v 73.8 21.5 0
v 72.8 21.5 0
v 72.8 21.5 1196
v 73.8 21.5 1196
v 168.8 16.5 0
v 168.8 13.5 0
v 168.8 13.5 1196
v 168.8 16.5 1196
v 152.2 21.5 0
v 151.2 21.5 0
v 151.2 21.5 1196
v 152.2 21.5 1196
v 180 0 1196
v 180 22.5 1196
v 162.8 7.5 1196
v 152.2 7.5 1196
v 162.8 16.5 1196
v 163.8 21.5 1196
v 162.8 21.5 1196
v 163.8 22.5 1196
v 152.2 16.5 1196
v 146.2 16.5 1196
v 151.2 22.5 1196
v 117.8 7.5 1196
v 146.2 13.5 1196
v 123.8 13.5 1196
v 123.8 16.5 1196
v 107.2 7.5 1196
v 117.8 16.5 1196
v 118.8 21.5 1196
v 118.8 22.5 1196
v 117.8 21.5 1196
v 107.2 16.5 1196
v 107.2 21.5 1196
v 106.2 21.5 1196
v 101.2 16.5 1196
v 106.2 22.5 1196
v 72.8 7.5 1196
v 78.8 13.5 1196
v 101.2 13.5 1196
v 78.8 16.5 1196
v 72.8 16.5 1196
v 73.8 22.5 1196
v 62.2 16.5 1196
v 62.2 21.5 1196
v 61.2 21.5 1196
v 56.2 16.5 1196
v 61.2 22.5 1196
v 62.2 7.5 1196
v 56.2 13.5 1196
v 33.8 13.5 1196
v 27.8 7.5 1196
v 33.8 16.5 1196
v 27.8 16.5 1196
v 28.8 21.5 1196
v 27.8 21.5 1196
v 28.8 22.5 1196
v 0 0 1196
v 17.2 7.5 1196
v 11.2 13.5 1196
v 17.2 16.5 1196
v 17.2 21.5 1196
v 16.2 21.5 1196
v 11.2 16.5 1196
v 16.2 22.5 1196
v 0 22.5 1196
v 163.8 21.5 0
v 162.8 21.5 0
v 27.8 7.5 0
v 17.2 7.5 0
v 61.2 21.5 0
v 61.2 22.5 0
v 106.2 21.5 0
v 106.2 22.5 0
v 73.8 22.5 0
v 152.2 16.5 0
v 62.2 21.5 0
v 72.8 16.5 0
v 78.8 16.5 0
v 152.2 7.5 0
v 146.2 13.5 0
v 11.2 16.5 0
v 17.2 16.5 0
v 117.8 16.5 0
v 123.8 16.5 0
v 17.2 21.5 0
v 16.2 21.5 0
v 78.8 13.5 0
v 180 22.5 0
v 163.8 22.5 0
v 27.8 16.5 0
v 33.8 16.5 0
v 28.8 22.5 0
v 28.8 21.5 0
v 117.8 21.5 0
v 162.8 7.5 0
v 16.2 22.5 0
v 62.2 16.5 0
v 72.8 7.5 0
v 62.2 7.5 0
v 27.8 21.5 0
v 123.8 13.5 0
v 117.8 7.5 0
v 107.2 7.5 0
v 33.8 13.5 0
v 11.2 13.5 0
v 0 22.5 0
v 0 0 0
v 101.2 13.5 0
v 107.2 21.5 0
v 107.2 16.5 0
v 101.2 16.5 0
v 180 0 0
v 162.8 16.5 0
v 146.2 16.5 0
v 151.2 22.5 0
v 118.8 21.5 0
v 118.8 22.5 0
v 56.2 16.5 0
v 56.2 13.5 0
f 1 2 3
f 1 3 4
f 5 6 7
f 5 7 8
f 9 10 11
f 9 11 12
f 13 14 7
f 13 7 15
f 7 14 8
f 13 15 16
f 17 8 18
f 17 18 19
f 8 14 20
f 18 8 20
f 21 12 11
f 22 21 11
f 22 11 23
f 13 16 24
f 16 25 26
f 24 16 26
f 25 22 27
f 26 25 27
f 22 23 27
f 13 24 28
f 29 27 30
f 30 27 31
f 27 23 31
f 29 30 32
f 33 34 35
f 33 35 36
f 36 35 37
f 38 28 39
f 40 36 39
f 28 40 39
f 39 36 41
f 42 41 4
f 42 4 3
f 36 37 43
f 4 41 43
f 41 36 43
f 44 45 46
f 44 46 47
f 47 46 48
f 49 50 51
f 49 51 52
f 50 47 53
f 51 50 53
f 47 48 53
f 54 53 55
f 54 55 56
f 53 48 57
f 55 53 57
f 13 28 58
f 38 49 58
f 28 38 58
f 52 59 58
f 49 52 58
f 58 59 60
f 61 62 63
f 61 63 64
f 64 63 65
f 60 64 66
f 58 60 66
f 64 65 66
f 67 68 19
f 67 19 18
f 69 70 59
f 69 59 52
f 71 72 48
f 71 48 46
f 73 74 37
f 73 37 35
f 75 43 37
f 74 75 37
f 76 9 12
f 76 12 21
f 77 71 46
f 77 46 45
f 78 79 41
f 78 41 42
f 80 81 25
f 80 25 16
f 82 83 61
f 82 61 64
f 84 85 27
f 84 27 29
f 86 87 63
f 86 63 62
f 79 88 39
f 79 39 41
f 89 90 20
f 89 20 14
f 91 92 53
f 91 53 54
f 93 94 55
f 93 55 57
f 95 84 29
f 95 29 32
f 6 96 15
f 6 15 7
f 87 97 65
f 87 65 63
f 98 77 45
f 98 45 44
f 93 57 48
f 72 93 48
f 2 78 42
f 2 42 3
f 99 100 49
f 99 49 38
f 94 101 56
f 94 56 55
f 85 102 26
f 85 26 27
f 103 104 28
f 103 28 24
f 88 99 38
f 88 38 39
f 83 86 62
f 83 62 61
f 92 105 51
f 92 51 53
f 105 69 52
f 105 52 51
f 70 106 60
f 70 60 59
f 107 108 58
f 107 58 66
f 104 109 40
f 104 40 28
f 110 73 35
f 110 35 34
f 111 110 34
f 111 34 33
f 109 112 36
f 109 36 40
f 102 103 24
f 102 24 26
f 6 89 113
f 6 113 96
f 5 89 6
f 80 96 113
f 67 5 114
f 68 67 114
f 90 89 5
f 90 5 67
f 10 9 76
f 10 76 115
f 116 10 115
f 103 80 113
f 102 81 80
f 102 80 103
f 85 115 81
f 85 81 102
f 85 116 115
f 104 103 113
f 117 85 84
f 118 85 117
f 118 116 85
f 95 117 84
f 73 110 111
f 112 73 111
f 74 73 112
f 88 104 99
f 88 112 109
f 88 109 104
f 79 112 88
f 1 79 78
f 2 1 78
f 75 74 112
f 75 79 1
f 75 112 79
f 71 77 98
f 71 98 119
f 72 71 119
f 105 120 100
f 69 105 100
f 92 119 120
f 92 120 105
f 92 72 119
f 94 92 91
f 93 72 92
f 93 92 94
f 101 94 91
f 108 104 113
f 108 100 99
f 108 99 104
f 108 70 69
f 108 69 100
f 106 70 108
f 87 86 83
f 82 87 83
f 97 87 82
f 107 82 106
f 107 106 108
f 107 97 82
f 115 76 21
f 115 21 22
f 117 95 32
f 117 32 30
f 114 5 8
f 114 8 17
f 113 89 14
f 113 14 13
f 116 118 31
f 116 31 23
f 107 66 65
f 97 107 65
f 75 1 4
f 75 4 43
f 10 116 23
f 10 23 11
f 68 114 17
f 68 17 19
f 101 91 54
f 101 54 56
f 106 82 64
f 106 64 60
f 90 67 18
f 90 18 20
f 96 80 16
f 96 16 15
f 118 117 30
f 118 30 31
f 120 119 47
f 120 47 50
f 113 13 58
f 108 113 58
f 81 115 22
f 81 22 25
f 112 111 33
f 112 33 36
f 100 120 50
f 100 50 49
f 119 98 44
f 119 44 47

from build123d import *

# Parameters (mm, degrees)
EXTRUDE1_DEPTH  = 1196
LPATTERN2_COUNT = 4
LPATTERN2_PITCH = 45


with BuildPart() as part:
    # Sketch1 → Extrude1 (new body)
    with BuildSketch(Plane.XY):
        Polygon((0, 22.5), (16.2, 22.5), (16.2, 21.5), (17.2, 21.5), (17.2, 16.5), (11.2, 16.5), (11.2, 13.5), (17.2, 7.5), (27.8, 7.5), (33.8, 13.5), (33.8, 16.5), (27.8, 16.5), (27.8, 21.5), (28.8, 21.5), (28.8, 22.5), (45, 22.5), (45, 0), (0, 0), align=None)
    extrude1 = extrude(amount=EXTRUDE1_DEPTH)

    # LPattern2: Extrude1 ×4
    with Locations(*[(i * LPATTERN2_PITCH, 0, 0) for i in range(1, LPATTERN2_COUNT)]):
        add(extrude1)


solid = part.part
